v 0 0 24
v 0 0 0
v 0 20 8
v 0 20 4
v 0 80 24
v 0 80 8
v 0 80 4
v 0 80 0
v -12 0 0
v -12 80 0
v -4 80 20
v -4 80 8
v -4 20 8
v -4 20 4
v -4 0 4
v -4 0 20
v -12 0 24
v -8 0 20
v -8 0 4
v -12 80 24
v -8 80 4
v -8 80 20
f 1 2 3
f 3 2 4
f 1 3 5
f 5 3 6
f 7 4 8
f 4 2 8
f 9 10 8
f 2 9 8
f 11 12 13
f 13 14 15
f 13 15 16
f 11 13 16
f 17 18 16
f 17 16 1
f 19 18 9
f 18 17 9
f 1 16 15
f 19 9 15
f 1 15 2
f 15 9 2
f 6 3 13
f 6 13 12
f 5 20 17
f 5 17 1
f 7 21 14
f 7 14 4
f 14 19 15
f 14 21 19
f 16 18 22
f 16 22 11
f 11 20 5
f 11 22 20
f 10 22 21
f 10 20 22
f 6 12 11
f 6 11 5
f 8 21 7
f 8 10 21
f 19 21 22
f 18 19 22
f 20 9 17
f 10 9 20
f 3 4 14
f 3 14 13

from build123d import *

# Parameters (mm, degrees)
F0_W     = 12
F0_H     = 80
F1_DEPTH = 24
F2_W     = 4
F2_H     = 16
F3_DEPTH = 9900
F4_W     = 60
F4_H     = 4
F5_DEPTH = 4


with BuildPart() as f1:
    # F0 (on Top) → F1 (new body)
    with BuildSketch(Plane.XY):
        with Locations((-6, 40)):
            Rectangle(F0_W, F0_H)
    extrude(amount=F1_DEPTH)

    # F2 (on face) → F3 (cut)
    with BuildSketch(Plane.XZ):
        with Locations((-6, 12)):
            Rectangle(F2_W, F2_H)
    extrude(amount=-F3_DEPTH, mode=Mode.SUBTRACT)

    # F4 (on face) → F5 (cut)
    with BuildSketch(Plane.YZ):
        with Locations((50, 6)):
            Rectangle(F4_W, F4_H)
    extrude(amount=-F5_DEPTH, mode=Mode.SUBTRACT)


solid = f1.part
